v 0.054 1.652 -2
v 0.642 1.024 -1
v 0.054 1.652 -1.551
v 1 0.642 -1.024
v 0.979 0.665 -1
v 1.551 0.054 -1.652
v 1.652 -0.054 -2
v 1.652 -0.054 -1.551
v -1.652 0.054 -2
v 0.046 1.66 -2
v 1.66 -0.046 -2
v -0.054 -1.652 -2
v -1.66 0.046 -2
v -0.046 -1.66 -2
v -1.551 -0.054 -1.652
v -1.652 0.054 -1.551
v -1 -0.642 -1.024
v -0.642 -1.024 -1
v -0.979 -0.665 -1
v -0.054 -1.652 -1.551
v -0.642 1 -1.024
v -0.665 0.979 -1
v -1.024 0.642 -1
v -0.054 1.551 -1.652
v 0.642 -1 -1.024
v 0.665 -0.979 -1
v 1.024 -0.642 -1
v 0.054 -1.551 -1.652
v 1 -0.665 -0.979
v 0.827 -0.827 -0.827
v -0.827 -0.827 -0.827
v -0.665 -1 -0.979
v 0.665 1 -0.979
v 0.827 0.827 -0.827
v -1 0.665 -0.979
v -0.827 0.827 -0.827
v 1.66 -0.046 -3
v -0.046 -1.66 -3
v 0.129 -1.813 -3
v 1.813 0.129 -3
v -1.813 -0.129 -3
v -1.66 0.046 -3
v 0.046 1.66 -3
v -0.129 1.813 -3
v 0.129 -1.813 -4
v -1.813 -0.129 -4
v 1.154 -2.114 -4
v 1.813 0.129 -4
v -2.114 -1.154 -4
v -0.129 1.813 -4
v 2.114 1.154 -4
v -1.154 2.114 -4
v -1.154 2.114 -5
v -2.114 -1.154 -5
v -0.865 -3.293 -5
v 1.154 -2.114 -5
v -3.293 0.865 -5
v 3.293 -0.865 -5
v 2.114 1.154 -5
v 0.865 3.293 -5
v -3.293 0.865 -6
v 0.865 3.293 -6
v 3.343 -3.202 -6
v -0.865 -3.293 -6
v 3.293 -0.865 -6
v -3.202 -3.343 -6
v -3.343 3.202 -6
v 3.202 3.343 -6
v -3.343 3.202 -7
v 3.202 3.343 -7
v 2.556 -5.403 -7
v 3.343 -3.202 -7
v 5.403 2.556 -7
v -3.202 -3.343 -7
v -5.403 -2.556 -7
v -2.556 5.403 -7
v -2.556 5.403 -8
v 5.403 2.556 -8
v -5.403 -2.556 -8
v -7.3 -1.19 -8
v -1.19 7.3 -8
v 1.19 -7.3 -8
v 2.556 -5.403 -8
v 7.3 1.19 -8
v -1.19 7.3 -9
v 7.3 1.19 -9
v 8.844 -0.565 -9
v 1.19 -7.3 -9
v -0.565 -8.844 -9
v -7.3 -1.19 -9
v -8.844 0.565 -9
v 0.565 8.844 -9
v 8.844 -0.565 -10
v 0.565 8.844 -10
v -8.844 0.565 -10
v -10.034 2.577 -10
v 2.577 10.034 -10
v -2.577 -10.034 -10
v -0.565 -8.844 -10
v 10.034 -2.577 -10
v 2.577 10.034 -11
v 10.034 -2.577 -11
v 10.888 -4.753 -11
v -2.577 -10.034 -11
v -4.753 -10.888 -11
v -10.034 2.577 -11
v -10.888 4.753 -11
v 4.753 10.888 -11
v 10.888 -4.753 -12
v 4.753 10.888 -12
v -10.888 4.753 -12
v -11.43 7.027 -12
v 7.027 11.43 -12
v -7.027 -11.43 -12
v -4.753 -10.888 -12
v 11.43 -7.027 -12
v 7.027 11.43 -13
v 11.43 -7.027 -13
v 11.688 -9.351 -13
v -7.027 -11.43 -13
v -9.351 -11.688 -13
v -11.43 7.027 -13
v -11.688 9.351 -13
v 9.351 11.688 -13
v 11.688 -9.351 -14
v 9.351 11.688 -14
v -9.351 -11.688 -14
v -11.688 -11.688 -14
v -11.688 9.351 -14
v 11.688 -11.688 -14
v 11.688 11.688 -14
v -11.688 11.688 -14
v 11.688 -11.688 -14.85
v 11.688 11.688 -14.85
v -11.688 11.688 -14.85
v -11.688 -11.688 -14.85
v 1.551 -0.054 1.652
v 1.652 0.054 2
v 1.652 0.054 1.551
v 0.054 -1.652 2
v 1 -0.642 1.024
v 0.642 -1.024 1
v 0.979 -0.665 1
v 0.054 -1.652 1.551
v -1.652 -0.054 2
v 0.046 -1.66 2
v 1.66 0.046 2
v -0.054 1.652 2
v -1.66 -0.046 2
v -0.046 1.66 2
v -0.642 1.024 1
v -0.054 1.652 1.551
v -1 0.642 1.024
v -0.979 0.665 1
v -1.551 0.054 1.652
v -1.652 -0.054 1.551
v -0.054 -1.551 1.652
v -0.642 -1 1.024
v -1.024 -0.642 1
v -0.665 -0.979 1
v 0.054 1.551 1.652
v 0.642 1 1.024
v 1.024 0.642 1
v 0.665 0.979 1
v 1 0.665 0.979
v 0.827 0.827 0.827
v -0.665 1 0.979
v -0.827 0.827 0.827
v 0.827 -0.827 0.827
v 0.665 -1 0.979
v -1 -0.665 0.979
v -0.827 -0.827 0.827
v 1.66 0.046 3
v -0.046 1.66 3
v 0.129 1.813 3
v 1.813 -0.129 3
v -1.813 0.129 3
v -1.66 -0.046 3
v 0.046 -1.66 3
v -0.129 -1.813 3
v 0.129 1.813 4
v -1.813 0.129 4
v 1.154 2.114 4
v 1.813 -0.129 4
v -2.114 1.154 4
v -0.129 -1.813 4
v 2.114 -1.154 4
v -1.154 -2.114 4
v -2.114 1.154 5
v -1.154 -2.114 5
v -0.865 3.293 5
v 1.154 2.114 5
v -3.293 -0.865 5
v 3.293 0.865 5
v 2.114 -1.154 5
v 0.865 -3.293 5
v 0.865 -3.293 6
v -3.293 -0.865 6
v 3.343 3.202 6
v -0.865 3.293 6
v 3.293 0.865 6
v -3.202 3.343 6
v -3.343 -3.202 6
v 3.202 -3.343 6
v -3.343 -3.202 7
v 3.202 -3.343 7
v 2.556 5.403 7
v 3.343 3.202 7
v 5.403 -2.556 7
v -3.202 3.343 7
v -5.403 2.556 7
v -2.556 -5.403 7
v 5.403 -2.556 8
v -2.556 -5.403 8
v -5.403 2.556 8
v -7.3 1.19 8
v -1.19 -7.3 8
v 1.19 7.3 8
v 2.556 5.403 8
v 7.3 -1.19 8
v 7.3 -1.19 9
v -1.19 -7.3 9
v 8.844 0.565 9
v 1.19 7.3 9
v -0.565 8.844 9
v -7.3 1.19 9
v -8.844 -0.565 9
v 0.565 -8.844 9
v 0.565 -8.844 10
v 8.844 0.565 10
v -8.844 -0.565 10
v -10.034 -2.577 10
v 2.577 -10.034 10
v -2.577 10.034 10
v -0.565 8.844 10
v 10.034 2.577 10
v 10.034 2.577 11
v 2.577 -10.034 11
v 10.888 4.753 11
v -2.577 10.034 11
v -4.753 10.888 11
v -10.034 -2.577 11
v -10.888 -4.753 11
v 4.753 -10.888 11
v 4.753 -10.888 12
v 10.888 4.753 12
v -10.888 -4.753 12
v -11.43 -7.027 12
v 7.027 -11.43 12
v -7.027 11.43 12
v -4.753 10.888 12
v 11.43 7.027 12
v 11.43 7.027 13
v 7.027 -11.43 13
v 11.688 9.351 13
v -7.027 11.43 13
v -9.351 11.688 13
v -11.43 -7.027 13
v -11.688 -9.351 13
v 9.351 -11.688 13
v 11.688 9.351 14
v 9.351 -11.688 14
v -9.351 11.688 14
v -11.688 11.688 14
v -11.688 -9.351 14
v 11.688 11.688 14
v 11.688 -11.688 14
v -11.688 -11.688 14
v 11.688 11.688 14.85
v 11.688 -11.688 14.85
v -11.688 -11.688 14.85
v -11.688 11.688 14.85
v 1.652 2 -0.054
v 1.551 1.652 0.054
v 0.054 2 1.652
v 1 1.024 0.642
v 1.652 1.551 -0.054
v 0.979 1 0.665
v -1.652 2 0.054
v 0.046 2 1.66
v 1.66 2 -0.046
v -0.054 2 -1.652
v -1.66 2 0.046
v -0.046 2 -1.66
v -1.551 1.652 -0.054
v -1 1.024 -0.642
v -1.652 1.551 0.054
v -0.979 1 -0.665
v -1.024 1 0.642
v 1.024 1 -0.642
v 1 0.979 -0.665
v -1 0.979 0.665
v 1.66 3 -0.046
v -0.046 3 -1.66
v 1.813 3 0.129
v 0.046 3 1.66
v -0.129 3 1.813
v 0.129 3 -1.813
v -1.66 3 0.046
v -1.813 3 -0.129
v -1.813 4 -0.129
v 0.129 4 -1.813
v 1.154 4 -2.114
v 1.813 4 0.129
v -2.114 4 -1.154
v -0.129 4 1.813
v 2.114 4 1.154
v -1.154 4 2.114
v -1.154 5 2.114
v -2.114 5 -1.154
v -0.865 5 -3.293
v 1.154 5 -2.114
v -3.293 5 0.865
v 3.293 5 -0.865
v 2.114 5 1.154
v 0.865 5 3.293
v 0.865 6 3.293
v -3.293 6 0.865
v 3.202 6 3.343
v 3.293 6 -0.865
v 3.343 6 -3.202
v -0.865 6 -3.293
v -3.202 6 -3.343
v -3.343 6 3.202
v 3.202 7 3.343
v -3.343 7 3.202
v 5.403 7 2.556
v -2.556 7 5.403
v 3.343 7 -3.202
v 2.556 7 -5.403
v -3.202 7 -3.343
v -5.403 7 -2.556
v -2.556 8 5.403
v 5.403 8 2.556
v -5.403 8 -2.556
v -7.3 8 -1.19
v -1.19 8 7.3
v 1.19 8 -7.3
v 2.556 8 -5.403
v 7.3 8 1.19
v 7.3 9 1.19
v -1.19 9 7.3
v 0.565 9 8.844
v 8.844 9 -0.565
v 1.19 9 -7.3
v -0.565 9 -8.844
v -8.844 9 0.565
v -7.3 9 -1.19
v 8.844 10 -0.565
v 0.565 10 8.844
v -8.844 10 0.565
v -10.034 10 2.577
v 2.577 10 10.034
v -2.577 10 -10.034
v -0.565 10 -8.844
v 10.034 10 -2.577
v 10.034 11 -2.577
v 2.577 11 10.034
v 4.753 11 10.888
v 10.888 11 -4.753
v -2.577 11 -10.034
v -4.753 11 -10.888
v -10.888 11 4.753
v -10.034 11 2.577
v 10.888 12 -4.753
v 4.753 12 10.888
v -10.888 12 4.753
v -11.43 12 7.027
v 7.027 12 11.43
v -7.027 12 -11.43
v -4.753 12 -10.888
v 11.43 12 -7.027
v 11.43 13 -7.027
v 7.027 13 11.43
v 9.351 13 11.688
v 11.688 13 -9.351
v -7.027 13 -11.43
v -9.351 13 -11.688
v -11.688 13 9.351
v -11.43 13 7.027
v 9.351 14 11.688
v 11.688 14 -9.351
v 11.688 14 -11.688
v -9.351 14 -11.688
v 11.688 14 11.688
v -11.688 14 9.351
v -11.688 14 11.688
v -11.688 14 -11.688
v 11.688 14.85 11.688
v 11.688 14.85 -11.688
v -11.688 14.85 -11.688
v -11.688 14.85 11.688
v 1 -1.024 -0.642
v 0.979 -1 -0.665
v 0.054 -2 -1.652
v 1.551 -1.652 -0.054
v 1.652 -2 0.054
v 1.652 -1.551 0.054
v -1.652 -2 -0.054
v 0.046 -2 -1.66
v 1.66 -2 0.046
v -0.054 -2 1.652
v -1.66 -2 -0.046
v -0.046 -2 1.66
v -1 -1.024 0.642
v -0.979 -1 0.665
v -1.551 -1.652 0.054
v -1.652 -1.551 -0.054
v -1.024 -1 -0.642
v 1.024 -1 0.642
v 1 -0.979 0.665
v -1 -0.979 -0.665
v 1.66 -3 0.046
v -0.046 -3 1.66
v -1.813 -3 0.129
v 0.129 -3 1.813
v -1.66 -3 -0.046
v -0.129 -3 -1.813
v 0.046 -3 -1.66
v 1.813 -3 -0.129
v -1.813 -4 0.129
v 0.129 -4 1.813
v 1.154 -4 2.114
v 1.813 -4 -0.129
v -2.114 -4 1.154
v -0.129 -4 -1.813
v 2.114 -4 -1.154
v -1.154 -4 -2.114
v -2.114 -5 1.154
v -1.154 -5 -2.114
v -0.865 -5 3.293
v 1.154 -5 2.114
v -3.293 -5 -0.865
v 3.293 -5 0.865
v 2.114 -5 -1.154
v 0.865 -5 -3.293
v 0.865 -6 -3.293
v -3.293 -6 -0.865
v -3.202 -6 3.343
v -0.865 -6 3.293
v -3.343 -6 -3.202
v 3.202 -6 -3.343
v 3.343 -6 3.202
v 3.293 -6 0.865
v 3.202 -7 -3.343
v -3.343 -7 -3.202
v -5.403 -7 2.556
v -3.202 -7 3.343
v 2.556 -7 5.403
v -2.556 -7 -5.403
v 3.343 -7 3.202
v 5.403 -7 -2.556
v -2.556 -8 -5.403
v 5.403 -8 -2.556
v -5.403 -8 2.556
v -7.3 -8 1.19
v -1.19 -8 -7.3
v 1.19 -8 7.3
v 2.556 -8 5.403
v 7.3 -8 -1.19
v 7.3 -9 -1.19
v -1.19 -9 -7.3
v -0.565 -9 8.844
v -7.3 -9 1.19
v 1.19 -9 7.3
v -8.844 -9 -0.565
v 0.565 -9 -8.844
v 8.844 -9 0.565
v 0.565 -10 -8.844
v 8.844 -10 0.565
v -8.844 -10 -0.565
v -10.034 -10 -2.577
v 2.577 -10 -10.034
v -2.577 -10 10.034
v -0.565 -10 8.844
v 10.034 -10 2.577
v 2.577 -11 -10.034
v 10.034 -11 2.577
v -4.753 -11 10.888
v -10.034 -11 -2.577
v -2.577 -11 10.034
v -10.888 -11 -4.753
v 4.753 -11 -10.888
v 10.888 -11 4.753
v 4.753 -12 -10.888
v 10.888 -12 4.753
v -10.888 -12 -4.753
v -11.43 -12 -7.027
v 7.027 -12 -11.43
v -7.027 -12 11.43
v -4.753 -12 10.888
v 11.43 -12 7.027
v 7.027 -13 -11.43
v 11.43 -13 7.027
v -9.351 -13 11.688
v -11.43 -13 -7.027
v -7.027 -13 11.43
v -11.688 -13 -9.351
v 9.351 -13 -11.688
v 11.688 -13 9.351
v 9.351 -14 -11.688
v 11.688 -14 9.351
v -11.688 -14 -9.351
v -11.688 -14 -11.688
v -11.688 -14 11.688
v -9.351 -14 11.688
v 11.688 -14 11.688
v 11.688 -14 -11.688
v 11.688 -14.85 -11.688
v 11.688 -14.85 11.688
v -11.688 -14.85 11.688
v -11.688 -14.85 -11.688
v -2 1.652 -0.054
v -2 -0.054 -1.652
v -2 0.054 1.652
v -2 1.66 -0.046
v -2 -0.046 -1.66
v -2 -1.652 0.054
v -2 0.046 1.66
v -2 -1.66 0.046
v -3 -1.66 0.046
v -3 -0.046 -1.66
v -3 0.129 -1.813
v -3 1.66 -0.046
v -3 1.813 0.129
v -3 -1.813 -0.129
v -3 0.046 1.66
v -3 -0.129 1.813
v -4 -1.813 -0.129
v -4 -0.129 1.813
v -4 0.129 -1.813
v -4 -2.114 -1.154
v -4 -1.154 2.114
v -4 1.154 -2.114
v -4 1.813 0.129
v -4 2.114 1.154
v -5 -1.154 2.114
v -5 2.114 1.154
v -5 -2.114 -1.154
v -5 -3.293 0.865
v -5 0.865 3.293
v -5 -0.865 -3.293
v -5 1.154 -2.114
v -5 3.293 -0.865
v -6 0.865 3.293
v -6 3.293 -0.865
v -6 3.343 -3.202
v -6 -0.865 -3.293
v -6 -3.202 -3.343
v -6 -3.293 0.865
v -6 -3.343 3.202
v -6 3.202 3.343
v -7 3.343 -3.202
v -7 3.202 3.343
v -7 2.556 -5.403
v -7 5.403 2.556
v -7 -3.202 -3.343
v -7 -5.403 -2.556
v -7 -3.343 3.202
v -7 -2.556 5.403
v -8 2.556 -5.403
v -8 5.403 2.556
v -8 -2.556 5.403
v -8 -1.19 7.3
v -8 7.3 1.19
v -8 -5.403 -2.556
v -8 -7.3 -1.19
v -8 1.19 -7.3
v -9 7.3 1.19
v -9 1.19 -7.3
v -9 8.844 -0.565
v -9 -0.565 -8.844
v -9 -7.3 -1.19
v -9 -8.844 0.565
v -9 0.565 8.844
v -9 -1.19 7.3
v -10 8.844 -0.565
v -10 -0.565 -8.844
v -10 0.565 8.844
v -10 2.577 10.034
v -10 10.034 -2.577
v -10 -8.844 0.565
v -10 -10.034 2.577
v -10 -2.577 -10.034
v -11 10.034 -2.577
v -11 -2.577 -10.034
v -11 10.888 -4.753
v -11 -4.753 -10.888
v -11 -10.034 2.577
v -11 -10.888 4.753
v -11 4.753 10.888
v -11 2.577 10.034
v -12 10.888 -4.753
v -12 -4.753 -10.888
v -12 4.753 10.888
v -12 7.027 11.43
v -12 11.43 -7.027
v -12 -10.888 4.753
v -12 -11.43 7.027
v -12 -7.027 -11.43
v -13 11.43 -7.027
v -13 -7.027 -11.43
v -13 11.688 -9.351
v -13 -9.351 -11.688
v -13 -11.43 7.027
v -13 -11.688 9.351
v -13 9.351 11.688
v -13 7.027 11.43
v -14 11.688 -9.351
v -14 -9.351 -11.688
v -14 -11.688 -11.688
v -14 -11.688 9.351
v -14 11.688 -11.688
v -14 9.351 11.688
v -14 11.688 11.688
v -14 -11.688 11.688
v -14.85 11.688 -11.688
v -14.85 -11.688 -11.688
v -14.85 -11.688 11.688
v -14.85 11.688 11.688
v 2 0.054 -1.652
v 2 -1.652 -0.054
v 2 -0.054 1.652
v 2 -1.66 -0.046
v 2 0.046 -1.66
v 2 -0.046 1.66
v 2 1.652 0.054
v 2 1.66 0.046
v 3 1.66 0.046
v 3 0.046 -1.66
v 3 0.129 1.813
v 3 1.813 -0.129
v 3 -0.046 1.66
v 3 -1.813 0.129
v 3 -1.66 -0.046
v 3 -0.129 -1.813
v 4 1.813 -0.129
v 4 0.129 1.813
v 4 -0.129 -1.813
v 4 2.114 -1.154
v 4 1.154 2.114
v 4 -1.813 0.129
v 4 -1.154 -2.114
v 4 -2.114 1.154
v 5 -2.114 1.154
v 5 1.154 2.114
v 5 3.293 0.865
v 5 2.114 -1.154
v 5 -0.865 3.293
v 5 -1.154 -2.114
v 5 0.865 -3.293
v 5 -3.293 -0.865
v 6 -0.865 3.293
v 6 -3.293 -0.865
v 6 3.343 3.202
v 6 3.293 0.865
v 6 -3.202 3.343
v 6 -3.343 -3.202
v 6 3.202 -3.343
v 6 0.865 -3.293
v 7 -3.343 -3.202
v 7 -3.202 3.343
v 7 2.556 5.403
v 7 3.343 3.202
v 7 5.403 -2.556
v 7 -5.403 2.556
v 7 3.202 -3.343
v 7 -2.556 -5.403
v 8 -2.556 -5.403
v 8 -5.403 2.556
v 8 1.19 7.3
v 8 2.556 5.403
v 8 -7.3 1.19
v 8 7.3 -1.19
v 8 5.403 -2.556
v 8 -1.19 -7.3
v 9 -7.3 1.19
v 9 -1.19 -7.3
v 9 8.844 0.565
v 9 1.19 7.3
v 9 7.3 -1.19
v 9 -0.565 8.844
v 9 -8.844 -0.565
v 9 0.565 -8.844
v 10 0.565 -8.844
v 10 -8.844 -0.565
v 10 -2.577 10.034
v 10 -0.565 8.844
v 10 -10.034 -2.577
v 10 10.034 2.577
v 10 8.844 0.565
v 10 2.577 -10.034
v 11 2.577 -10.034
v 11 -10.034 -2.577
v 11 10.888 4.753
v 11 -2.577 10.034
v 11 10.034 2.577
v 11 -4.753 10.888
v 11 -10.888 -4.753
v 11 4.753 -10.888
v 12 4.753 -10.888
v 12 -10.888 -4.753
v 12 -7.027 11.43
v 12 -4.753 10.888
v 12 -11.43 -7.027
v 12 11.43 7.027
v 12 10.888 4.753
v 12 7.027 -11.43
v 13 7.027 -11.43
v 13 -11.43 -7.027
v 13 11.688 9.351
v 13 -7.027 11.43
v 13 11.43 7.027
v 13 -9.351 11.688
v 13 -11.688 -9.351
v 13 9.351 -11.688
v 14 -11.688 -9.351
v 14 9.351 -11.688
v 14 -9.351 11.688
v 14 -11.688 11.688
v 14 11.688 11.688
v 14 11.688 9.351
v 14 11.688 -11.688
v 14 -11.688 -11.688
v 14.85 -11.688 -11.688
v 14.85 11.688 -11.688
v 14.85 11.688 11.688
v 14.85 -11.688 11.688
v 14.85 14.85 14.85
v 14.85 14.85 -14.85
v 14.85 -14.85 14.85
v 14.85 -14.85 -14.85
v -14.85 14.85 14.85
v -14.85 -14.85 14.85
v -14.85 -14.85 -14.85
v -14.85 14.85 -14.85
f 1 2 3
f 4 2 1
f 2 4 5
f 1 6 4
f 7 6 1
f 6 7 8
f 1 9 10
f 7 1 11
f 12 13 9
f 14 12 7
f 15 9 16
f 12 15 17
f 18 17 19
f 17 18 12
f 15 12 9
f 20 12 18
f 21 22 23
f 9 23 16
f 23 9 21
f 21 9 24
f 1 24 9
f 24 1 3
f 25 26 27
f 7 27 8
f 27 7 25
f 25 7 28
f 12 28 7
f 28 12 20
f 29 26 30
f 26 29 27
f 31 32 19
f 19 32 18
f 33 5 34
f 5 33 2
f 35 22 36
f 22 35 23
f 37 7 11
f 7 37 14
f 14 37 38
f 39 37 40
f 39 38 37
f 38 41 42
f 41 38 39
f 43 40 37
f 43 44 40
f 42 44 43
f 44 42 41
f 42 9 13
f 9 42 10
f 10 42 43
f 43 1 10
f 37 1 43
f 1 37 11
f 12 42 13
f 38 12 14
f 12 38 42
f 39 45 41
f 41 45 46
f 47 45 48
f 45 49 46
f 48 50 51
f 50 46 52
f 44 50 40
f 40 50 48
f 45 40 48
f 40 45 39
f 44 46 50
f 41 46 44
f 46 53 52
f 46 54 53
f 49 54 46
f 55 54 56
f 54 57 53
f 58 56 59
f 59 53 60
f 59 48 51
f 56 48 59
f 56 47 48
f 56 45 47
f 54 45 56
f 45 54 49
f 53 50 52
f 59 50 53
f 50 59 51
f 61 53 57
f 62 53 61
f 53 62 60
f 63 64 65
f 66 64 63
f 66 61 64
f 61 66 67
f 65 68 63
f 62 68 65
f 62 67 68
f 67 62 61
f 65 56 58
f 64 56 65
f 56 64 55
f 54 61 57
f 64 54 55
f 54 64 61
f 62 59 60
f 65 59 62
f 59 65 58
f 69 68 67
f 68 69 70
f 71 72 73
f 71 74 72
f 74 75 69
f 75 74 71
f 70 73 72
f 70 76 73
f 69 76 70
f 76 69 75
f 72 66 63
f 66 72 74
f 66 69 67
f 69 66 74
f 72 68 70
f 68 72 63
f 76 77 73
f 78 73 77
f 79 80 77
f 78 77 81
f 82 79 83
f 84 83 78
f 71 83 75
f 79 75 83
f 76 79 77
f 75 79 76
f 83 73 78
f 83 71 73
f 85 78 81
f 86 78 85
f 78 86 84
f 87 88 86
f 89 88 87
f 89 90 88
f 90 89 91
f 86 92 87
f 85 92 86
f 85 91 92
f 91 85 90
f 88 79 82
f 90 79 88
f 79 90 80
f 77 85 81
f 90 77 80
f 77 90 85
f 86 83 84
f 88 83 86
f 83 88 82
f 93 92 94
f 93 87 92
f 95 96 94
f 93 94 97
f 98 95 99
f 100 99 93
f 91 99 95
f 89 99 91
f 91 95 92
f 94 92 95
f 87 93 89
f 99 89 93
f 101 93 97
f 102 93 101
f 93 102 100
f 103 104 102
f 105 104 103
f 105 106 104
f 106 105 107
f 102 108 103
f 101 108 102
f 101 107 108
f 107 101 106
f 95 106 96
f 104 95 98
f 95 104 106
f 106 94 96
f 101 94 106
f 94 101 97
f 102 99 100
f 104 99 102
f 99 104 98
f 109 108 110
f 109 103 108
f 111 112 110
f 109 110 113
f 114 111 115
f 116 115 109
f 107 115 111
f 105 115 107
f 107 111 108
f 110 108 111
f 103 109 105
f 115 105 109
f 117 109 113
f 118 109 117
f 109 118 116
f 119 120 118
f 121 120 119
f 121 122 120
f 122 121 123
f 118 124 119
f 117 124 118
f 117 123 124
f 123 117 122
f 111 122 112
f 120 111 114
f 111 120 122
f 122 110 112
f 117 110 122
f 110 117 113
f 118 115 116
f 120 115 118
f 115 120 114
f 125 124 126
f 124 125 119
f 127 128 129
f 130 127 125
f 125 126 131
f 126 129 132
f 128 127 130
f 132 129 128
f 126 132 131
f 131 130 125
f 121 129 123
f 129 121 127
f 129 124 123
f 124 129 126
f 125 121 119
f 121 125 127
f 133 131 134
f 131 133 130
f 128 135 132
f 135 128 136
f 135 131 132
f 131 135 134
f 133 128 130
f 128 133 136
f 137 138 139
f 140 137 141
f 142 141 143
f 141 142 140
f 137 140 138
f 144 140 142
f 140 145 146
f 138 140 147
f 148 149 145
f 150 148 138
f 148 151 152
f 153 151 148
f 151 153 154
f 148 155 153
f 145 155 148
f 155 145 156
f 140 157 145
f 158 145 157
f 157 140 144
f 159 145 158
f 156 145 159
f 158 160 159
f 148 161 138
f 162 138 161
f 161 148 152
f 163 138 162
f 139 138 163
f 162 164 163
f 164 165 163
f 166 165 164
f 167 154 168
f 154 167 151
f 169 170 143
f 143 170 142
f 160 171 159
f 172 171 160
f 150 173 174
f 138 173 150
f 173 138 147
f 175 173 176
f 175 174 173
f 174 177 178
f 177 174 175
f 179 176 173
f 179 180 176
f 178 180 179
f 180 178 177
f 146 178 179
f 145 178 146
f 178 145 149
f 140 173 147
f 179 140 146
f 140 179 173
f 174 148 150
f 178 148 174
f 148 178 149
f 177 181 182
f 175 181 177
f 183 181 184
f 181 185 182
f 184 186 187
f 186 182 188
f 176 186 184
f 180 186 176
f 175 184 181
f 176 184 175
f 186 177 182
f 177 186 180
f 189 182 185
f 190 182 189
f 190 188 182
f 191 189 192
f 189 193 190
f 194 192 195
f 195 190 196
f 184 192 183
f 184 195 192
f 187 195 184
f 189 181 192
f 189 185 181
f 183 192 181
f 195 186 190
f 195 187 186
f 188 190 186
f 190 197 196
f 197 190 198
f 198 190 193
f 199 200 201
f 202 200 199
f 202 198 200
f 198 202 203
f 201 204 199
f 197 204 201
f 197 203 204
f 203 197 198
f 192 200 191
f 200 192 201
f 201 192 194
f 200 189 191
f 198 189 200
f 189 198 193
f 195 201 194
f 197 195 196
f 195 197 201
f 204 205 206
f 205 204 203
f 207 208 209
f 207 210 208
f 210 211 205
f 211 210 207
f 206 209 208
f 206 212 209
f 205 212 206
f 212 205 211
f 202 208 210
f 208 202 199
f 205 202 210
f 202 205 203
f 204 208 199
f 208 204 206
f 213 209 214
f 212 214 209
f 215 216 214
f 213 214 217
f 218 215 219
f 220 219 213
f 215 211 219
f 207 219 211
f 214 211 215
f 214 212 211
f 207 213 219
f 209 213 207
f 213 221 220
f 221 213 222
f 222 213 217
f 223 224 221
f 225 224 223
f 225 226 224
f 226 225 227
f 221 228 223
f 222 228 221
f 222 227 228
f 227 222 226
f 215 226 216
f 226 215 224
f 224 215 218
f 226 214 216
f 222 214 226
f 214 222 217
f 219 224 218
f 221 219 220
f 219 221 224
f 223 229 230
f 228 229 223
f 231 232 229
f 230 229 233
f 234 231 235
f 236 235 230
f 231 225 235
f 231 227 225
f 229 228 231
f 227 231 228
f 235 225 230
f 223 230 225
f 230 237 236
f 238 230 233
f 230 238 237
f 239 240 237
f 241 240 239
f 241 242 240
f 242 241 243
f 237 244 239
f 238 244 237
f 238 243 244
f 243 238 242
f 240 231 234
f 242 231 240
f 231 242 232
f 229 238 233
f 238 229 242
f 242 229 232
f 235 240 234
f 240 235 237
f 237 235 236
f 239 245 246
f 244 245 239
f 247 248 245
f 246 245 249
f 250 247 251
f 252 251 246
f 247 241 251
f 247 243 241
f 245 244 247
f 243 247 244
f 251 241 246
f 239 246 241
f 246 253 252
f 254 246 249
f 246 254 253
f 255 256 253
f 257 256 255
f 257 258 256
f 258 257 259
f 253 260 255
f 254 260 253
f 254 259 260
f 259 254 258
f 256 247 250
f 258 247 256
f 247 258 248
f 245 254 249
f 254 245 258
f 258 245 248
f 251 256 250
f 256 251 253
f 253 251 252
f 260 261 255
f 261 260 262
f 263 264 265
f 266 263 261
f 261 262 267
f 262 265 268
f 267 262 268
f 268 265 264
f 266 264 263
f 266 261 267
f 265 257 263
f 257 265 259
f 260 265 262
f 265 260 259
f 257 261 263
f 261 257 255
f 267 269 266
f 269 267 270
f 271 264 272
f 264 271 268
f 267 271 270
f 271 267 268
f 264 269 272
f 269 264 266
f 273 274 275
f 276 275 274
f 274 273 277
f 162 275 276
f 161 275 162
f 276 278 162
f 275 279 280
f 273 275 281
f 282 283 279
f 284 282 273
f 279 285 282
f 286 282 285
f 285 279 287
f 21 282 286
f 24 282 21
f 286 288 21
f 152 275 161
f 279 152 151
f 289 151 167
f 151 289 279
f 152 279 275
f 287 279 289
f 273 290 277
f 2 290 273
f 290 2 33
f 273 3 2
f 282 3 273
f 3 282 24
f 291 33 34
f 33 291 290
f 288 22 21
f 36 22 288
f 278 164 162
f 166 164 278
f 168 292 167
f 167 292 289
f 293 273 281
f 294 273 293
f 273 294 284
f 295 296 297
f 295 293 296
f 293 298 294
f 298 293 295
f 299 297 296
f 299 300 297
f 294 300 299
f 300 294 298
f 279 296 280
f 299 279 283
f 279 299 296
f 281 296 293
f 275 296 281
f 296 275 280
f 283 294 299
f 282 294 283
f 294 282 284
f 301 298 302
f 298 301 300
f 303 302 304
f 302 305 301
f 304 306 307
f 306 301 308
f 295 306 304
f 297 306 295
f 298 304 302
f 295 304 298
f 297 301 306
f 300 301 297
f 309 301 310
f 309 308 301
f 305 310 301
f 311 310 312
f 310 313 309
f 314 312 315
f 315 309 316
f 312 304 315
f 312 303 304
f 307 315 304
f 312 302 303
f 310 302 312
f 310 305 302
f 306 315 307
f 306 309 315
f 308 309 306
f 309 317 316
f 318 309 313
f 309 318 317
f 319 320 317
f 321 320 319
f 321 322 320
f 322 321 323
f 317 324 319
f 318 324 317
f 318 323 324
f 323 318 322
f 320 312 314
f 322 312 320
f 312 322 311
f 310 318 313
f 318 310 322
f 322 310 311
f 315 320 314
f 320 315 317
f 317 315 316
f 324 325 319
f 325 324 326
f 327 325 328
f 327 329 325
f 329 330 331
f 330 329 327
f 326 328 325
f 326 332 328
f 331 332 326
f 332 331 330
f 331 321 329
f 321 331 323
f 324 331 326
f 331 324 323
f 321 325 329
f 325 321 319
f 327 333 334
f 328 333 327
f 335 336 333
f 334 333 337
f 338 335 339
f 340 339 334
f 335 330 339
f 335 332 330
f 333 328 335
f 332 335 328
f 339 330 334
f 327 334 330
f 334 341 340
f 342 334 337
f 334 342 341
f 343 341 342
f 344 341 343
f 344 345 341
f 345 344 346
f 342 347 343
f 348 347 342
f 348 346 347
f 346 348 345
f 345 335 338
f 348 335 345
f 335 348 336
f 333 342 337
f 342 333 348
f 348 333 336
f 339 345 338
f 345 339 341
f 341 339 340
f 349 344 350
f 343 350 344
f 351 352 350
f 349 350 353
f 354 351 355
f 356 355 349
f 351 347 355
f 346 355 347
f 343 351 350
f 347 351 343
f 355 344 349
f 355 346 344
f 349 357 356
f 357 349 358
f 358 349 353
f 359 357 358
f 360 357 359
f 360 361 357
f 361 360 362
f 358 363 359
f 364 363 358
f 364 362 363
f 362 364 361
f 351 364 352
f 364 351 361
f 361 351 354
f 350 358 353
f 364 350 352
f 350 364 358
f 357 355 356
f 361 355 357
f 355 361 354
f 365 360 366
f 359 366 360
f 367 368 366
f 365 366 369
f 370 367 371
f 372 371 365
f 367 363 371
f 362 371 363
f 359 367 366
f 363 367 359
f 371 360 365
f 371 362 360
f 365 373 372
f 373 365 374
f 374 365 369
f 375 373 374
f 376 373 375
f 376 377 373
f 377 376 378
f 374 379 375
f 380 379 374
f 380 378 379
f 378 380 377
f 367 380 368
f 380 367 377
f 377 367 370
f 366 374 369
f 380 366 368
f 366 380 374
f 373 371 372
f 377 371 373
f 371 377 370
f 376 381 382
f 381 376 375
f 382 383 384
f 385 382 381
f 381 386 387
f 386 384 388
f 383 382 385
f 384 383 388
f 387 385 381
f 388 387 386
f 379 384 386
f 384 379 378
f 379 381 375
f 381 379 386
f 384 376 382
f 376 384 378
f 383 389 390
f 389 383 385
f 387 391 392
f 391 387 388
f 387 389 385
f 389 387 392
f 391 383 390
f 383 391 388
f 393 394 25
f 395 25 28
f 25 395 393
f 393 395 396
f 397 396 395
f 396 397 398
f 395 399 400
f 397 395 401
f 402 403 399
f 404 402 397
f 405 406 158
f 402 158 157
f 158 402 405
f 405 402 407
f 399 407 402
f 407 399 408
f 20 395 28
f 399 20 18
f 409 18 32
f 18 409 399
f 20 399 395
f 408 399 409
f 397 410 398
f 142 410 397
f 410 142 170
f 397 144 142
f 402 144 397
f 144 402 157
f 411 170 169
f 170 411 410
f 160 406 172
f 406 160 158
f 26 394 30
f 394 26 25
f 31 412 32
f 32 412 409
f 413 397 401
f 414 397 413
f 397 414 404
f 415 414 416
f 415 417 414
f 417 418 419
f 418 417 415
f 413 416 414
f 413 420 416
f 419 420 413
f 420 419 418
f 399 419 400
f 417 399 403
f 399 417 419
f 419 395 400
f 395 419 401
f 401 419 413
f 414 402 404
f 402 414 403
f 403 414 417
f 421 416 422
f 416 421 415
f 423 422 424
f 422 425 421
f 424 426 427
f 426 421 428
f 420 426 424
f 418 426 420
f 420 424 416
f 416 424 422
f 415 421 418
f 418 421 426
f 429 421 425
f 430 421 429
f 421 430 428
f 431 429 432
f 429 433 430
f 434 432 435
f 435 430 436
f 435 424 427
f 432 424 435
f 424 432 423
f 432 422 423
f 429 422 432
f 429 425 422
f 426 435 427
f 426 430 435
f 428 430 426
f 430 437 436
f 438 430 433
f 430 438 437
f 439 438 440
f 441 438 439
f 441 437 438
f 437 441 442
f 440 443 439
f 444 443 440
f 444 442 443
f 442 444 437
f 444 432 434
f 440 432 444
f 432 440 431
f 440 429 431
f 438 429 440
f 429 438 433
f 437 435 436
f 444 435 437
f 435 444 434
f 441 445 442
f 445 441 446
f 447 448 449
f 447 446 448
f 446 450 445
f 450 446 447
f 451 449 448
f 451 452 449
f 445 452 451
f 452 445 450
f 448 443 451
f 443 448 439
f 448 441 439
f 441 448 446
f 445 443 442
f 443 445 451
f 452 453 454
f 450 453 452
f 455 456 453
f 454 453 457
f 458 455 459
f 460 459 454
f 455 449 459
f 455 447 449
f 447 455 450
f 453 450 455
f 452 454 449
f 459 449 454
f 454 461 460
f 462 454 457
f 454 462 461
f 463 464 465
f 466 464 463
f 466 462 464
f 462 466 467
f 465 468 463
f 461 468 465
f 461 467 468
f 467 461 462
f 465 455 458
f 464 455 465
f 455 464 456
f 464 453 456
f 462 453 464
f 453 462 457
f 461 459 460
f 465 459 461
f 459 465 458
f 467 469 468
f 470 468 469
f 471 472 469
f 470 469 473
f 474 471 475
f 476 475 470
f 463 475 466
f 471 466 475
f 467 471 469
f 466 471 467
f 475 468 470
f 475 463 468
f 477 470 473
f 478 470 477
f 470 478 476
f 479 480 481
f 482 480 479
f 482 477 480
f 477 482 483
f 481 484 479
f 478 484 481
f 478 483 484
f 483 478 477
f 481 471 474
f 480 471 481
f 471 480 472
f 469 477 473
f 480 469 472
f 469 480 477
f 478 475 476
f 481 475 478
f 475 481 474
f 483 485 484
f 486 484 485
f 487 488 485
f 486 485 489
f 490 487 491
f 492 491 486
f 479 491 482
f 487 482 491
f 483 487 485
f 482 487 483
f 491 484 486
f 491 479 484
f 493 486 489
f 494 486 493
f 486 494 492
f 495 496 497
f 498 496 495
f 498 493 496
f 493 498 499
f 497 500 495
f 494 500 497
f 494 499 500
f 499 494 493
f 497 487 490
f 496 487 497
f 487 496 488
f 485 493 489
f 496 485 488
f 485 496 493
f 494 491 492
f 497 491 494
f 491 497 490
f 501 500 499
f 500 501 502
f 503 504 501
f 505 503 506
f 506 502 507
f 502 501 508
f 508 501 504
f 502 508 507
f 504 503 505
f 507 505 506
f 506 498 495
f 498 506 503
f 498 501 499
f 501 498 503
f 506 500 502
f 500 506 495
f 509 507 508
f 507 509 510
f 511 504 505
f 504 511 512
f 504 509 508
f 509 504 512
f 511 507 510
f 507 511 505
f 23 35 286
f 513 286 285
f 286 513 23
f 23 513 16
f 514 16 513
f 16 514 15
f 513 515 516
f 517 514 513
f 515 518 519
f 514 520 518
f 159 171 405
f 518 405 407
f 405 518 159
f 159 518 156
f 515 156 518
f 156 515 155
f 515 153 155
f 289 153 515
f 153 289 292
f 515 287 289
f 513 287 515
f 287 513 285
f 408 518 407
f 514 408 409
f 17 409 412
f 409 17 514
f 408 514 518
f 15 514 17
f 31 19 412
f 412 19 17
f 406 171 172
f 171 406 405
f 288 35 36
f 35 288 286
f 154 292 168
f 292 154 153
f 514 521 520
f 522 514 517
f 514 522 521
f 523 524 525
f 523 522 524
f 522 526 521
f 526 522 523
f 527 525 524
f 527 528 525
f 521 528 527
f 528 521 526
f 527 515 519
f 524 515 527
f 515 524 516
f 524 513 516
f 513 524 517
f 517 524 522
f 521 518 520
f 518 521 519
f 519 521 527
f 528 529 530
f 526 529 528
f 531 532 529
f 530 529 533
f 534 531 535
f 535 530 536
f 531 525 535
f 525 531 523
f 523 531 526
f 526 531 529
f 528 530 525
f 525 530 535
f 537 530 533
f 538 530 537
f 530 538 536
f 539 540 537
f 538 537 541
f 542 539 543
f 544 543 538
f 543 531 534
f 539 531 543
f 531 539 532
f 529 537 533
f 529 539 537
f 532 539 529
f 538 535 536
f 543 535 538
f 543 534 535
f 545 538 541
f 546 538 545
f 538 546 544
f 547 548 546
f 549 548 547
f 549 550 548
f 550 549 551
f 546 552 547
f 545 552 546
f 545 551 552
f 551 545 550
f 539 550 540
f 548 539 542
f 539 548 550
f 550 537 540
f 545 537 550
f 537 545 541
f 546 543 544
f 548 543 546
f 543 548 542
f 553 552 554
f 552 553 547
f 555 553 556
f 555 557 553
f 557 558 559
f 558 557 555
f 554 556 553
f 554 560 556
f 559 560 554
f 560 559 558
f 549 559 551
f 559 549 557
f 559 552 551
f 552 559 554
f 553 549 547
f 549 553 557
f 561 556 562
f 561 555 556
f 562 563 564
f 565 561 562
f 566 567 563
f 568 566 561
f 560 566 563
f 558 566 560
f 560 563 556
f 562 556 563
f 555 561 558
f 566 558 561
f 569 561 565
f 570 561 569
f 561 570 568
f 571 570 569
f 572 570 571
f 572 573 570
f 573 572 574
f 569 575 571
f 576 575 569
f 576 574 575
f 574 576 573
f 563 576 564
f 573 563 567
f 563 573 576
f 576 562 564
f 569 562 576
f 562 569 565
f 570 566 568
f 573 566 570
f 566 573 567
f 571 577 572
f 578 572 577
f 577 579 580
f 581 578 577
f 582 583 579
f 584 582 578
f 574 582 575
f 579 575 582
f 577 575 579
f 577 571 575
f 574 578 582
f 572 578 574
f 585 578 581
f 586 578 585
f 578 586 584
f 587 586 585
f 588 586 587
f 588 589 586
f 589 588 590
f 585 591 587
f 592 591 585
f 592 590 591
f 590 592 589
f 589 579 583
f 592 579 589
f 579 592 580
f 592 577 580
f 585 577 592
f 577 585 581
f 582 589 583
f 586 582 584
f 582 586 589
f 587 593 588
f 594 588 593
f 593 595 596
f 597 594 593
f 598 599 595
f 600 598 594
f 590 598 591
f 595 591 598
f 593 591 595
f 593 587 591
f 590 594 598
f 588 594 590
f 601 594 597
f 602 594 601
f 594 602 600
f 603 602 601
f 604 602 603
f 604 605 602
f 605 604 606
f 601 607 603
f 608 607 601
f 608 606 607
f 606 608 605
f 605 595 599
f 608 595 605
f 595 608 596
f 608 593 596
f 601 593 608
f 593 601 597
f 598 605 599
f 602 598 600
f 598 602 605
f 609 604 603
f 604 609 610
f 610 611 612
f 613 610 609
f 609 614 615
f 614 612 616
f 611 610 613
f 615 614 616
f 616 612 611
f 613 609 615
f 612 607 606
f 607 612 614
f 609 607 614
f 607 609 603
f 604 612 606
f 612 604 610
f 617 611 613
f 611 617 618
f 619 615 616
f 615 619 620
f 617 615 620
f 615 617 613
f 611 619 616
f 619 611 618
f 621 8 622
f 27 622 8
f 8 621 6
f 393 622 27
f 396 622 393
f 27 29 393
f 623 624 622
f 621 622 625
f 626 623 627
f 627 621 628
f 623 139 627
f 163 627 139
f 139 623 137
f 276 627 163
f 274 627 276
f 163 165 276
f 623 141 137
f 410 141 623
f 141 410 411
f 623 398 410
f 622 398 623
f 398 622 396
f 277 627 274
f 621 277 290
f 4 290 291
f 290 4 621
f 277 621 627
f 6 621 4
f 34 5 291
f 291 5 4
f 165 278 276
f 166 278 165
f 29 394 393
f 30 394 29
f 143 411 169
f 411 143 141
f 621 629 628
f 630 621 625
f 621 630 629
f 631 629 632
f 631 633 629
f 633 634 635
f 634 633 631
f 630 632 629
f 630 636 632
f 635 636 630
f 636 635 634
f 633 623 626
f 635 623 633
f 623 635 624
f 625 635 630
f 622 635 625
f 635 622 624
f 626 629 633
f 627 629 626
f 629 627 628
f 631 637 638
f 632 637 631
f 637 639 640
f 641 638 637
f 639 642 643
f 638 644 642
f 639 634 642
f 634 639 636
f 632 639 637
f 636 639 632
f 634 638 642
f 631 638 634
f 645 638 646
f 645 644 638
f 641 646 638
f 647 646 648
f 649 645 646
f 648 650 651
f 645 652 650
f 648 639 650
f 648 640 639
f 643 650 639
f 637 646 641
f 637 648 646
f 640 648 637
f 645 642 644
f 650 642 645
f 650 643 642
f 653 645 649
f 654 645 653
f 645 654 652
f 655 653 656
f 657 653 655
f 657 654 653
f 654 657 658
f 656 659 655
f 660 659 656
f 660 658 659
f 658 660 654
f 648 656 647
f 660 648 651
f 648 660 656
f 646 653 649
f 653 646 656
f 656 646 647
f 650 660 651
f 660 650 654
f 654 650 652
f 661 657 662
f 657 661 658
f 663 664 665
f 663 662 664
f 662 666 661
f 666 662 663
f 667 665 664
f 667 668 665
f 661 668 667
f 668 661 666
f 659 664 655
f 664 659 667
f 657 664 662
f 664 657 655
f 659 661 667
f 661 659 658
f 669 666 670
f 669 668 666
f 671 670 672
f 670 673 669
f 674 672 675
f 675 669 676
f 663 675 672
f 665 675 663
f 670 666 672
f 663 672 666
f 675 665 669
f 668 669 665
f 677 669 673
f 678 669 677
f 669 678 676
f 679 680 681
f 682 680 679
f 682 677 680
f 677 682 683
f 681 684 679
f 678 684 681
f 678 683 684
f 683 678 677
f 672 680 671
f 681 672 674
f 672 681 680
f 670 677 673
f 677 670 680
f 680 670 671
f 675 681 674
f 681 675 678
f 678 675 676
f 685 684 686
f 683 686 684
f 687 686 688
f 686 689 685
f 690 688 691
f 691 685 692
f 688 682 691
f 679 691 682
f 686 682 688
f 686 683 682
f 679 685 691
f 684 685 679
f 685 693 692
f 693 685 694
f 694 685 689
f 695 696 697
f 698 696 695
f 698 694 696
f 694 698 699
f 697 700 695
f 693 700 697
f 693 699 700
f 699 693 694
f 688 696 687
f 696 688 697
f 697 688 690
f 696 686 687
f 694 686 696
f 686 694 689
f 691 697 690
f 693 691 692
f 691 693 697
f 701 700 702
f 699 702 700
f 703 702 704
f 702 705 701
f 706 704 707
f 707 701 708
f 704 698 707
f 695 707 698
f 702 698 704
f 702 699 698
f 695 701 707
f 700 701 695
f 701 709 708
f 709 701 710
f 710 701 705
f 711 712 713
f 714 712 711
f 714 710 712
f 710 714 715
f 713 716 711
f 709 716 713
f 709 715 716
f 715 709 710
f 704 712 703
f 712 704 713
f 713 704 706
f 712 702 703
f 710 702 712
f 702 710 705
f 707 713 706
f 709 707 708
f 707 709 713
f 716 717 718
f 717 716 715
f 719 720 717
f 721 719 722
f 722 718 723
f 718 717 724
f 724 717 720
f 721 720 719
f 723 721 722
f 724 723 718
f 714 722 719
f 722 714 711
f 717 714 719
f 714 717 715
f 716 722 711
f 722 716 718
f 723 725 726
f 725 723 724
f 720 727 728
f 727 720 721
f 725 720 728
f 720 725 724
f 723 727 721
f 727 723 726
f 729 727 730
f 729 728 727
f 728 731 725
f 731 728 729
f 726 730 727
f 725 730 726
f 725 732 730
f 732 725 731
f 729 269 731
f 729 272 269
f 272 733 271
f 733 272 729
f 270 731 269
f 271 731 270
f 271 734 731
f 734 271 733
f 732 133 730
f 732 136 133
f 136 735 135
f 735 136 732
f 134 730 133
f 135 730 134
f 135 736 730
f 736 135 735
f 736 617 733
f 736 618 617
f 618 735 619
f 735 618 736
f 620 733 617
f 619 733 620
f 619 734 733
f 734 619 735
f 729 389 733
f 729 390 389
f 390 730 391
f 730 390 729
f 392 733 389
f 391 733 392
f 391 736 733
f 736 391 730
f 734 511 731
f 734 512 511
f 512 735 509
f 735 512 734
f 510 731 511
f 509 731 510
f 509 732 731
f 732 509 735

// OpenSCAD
leng = 30;
leng_diff = 3;
min_leng = 3;
model = "Cube"; // [Cube, Base, Both]

module spiral_stack(orig_leng, orig_height, current_leng, leng_diff, min_leng, angle_offset, pre_height = 0, i = 0) {
    if(current_leng > min_leng && current_leng - leng_diff > 0) {
        angle = atan2(leng_diff, current_leng - leng_diff);
        
        factor = current_leng / orig_leng;
        
        translate([0, 0, pre_height]) 
            scale([factor, factor, 1]) 
                children();
         
        next_square_leng = sqrt(pow(leng_diff, 2) + pow(current_leng - leng_diff, 2));
        
        height = orig_height + pre_height;
        
        rotate(angle + angle_offset)
            spiral_stack(
                orig_leng, 
                orig_height, 
                next_square_leng, 
                leng_diff, 
                min_leng,
                angle_offset,                
                height,
                i + 1
            ) children();
    } else {
       // for debugging
       //  echo(i);
       // echo(current_leng / orig_leng * orig_height / 2);
    }
}

module spiral_cube(leng, leng_diff, min_leng) {
    thickness = leng / 30;

    module spiral_squares() {
        translate([0, 0, -leng / 2]) 
            spiral_stack(leng + leng_diff * 2 + thickness * 2.5, thickness, leng, leng_diff, min_leng, 0)
                translate([0, 0, thickness / 2]) 
                    cube([leng , leng, thickness], center = true);
    }

    module pair_spiral_squares() {
        spiral_squares();
        //mirror([0, 0, 1])
        rotate([180, 0, 0])
            spiral_squares();
    }

    difference() {
        cube(leng * 0.99, center = true);
        
        pair_spiral_squares();
        rotate([90, 0, 0]) pair_spiral_squares();
        rotate([0, 90, 0]) pair_spiral_squares();
         
    }
}

module base(leng) {
    $fn = 96;
    r = leng / 3;
    difference() {
        difference() {
            sphere(r);
            translate([0, 0, -r]) 
                linear_extrude(r) 
                    square(r * 2, center = true);
        }
        translate([0, 0, leng * sqrt(3) / 2 + leng / 15]) 
            rotate([45, atan2(1, sqrt(2)), 0]) 
                cube(leng * 0.99, center = true);
    }
}

if(model == "Cube") {
    spiral_cube(leng, leng_diff, min_leng);
} else if(model == "Base") {
    base(leng);
} else {

    // Because of float precision problems, I roate the base instead of the cube.
    spiral_cube(leng, leng_diff, min_leng);
    rotate([-45, 0, 0]) 
        rotate([0, -atan2(1, sqrt(2)), 0]) 
            translate([0, 0, -leng * sqrt(3) / 2 - leng / 15]) 
                base(leng);
}
